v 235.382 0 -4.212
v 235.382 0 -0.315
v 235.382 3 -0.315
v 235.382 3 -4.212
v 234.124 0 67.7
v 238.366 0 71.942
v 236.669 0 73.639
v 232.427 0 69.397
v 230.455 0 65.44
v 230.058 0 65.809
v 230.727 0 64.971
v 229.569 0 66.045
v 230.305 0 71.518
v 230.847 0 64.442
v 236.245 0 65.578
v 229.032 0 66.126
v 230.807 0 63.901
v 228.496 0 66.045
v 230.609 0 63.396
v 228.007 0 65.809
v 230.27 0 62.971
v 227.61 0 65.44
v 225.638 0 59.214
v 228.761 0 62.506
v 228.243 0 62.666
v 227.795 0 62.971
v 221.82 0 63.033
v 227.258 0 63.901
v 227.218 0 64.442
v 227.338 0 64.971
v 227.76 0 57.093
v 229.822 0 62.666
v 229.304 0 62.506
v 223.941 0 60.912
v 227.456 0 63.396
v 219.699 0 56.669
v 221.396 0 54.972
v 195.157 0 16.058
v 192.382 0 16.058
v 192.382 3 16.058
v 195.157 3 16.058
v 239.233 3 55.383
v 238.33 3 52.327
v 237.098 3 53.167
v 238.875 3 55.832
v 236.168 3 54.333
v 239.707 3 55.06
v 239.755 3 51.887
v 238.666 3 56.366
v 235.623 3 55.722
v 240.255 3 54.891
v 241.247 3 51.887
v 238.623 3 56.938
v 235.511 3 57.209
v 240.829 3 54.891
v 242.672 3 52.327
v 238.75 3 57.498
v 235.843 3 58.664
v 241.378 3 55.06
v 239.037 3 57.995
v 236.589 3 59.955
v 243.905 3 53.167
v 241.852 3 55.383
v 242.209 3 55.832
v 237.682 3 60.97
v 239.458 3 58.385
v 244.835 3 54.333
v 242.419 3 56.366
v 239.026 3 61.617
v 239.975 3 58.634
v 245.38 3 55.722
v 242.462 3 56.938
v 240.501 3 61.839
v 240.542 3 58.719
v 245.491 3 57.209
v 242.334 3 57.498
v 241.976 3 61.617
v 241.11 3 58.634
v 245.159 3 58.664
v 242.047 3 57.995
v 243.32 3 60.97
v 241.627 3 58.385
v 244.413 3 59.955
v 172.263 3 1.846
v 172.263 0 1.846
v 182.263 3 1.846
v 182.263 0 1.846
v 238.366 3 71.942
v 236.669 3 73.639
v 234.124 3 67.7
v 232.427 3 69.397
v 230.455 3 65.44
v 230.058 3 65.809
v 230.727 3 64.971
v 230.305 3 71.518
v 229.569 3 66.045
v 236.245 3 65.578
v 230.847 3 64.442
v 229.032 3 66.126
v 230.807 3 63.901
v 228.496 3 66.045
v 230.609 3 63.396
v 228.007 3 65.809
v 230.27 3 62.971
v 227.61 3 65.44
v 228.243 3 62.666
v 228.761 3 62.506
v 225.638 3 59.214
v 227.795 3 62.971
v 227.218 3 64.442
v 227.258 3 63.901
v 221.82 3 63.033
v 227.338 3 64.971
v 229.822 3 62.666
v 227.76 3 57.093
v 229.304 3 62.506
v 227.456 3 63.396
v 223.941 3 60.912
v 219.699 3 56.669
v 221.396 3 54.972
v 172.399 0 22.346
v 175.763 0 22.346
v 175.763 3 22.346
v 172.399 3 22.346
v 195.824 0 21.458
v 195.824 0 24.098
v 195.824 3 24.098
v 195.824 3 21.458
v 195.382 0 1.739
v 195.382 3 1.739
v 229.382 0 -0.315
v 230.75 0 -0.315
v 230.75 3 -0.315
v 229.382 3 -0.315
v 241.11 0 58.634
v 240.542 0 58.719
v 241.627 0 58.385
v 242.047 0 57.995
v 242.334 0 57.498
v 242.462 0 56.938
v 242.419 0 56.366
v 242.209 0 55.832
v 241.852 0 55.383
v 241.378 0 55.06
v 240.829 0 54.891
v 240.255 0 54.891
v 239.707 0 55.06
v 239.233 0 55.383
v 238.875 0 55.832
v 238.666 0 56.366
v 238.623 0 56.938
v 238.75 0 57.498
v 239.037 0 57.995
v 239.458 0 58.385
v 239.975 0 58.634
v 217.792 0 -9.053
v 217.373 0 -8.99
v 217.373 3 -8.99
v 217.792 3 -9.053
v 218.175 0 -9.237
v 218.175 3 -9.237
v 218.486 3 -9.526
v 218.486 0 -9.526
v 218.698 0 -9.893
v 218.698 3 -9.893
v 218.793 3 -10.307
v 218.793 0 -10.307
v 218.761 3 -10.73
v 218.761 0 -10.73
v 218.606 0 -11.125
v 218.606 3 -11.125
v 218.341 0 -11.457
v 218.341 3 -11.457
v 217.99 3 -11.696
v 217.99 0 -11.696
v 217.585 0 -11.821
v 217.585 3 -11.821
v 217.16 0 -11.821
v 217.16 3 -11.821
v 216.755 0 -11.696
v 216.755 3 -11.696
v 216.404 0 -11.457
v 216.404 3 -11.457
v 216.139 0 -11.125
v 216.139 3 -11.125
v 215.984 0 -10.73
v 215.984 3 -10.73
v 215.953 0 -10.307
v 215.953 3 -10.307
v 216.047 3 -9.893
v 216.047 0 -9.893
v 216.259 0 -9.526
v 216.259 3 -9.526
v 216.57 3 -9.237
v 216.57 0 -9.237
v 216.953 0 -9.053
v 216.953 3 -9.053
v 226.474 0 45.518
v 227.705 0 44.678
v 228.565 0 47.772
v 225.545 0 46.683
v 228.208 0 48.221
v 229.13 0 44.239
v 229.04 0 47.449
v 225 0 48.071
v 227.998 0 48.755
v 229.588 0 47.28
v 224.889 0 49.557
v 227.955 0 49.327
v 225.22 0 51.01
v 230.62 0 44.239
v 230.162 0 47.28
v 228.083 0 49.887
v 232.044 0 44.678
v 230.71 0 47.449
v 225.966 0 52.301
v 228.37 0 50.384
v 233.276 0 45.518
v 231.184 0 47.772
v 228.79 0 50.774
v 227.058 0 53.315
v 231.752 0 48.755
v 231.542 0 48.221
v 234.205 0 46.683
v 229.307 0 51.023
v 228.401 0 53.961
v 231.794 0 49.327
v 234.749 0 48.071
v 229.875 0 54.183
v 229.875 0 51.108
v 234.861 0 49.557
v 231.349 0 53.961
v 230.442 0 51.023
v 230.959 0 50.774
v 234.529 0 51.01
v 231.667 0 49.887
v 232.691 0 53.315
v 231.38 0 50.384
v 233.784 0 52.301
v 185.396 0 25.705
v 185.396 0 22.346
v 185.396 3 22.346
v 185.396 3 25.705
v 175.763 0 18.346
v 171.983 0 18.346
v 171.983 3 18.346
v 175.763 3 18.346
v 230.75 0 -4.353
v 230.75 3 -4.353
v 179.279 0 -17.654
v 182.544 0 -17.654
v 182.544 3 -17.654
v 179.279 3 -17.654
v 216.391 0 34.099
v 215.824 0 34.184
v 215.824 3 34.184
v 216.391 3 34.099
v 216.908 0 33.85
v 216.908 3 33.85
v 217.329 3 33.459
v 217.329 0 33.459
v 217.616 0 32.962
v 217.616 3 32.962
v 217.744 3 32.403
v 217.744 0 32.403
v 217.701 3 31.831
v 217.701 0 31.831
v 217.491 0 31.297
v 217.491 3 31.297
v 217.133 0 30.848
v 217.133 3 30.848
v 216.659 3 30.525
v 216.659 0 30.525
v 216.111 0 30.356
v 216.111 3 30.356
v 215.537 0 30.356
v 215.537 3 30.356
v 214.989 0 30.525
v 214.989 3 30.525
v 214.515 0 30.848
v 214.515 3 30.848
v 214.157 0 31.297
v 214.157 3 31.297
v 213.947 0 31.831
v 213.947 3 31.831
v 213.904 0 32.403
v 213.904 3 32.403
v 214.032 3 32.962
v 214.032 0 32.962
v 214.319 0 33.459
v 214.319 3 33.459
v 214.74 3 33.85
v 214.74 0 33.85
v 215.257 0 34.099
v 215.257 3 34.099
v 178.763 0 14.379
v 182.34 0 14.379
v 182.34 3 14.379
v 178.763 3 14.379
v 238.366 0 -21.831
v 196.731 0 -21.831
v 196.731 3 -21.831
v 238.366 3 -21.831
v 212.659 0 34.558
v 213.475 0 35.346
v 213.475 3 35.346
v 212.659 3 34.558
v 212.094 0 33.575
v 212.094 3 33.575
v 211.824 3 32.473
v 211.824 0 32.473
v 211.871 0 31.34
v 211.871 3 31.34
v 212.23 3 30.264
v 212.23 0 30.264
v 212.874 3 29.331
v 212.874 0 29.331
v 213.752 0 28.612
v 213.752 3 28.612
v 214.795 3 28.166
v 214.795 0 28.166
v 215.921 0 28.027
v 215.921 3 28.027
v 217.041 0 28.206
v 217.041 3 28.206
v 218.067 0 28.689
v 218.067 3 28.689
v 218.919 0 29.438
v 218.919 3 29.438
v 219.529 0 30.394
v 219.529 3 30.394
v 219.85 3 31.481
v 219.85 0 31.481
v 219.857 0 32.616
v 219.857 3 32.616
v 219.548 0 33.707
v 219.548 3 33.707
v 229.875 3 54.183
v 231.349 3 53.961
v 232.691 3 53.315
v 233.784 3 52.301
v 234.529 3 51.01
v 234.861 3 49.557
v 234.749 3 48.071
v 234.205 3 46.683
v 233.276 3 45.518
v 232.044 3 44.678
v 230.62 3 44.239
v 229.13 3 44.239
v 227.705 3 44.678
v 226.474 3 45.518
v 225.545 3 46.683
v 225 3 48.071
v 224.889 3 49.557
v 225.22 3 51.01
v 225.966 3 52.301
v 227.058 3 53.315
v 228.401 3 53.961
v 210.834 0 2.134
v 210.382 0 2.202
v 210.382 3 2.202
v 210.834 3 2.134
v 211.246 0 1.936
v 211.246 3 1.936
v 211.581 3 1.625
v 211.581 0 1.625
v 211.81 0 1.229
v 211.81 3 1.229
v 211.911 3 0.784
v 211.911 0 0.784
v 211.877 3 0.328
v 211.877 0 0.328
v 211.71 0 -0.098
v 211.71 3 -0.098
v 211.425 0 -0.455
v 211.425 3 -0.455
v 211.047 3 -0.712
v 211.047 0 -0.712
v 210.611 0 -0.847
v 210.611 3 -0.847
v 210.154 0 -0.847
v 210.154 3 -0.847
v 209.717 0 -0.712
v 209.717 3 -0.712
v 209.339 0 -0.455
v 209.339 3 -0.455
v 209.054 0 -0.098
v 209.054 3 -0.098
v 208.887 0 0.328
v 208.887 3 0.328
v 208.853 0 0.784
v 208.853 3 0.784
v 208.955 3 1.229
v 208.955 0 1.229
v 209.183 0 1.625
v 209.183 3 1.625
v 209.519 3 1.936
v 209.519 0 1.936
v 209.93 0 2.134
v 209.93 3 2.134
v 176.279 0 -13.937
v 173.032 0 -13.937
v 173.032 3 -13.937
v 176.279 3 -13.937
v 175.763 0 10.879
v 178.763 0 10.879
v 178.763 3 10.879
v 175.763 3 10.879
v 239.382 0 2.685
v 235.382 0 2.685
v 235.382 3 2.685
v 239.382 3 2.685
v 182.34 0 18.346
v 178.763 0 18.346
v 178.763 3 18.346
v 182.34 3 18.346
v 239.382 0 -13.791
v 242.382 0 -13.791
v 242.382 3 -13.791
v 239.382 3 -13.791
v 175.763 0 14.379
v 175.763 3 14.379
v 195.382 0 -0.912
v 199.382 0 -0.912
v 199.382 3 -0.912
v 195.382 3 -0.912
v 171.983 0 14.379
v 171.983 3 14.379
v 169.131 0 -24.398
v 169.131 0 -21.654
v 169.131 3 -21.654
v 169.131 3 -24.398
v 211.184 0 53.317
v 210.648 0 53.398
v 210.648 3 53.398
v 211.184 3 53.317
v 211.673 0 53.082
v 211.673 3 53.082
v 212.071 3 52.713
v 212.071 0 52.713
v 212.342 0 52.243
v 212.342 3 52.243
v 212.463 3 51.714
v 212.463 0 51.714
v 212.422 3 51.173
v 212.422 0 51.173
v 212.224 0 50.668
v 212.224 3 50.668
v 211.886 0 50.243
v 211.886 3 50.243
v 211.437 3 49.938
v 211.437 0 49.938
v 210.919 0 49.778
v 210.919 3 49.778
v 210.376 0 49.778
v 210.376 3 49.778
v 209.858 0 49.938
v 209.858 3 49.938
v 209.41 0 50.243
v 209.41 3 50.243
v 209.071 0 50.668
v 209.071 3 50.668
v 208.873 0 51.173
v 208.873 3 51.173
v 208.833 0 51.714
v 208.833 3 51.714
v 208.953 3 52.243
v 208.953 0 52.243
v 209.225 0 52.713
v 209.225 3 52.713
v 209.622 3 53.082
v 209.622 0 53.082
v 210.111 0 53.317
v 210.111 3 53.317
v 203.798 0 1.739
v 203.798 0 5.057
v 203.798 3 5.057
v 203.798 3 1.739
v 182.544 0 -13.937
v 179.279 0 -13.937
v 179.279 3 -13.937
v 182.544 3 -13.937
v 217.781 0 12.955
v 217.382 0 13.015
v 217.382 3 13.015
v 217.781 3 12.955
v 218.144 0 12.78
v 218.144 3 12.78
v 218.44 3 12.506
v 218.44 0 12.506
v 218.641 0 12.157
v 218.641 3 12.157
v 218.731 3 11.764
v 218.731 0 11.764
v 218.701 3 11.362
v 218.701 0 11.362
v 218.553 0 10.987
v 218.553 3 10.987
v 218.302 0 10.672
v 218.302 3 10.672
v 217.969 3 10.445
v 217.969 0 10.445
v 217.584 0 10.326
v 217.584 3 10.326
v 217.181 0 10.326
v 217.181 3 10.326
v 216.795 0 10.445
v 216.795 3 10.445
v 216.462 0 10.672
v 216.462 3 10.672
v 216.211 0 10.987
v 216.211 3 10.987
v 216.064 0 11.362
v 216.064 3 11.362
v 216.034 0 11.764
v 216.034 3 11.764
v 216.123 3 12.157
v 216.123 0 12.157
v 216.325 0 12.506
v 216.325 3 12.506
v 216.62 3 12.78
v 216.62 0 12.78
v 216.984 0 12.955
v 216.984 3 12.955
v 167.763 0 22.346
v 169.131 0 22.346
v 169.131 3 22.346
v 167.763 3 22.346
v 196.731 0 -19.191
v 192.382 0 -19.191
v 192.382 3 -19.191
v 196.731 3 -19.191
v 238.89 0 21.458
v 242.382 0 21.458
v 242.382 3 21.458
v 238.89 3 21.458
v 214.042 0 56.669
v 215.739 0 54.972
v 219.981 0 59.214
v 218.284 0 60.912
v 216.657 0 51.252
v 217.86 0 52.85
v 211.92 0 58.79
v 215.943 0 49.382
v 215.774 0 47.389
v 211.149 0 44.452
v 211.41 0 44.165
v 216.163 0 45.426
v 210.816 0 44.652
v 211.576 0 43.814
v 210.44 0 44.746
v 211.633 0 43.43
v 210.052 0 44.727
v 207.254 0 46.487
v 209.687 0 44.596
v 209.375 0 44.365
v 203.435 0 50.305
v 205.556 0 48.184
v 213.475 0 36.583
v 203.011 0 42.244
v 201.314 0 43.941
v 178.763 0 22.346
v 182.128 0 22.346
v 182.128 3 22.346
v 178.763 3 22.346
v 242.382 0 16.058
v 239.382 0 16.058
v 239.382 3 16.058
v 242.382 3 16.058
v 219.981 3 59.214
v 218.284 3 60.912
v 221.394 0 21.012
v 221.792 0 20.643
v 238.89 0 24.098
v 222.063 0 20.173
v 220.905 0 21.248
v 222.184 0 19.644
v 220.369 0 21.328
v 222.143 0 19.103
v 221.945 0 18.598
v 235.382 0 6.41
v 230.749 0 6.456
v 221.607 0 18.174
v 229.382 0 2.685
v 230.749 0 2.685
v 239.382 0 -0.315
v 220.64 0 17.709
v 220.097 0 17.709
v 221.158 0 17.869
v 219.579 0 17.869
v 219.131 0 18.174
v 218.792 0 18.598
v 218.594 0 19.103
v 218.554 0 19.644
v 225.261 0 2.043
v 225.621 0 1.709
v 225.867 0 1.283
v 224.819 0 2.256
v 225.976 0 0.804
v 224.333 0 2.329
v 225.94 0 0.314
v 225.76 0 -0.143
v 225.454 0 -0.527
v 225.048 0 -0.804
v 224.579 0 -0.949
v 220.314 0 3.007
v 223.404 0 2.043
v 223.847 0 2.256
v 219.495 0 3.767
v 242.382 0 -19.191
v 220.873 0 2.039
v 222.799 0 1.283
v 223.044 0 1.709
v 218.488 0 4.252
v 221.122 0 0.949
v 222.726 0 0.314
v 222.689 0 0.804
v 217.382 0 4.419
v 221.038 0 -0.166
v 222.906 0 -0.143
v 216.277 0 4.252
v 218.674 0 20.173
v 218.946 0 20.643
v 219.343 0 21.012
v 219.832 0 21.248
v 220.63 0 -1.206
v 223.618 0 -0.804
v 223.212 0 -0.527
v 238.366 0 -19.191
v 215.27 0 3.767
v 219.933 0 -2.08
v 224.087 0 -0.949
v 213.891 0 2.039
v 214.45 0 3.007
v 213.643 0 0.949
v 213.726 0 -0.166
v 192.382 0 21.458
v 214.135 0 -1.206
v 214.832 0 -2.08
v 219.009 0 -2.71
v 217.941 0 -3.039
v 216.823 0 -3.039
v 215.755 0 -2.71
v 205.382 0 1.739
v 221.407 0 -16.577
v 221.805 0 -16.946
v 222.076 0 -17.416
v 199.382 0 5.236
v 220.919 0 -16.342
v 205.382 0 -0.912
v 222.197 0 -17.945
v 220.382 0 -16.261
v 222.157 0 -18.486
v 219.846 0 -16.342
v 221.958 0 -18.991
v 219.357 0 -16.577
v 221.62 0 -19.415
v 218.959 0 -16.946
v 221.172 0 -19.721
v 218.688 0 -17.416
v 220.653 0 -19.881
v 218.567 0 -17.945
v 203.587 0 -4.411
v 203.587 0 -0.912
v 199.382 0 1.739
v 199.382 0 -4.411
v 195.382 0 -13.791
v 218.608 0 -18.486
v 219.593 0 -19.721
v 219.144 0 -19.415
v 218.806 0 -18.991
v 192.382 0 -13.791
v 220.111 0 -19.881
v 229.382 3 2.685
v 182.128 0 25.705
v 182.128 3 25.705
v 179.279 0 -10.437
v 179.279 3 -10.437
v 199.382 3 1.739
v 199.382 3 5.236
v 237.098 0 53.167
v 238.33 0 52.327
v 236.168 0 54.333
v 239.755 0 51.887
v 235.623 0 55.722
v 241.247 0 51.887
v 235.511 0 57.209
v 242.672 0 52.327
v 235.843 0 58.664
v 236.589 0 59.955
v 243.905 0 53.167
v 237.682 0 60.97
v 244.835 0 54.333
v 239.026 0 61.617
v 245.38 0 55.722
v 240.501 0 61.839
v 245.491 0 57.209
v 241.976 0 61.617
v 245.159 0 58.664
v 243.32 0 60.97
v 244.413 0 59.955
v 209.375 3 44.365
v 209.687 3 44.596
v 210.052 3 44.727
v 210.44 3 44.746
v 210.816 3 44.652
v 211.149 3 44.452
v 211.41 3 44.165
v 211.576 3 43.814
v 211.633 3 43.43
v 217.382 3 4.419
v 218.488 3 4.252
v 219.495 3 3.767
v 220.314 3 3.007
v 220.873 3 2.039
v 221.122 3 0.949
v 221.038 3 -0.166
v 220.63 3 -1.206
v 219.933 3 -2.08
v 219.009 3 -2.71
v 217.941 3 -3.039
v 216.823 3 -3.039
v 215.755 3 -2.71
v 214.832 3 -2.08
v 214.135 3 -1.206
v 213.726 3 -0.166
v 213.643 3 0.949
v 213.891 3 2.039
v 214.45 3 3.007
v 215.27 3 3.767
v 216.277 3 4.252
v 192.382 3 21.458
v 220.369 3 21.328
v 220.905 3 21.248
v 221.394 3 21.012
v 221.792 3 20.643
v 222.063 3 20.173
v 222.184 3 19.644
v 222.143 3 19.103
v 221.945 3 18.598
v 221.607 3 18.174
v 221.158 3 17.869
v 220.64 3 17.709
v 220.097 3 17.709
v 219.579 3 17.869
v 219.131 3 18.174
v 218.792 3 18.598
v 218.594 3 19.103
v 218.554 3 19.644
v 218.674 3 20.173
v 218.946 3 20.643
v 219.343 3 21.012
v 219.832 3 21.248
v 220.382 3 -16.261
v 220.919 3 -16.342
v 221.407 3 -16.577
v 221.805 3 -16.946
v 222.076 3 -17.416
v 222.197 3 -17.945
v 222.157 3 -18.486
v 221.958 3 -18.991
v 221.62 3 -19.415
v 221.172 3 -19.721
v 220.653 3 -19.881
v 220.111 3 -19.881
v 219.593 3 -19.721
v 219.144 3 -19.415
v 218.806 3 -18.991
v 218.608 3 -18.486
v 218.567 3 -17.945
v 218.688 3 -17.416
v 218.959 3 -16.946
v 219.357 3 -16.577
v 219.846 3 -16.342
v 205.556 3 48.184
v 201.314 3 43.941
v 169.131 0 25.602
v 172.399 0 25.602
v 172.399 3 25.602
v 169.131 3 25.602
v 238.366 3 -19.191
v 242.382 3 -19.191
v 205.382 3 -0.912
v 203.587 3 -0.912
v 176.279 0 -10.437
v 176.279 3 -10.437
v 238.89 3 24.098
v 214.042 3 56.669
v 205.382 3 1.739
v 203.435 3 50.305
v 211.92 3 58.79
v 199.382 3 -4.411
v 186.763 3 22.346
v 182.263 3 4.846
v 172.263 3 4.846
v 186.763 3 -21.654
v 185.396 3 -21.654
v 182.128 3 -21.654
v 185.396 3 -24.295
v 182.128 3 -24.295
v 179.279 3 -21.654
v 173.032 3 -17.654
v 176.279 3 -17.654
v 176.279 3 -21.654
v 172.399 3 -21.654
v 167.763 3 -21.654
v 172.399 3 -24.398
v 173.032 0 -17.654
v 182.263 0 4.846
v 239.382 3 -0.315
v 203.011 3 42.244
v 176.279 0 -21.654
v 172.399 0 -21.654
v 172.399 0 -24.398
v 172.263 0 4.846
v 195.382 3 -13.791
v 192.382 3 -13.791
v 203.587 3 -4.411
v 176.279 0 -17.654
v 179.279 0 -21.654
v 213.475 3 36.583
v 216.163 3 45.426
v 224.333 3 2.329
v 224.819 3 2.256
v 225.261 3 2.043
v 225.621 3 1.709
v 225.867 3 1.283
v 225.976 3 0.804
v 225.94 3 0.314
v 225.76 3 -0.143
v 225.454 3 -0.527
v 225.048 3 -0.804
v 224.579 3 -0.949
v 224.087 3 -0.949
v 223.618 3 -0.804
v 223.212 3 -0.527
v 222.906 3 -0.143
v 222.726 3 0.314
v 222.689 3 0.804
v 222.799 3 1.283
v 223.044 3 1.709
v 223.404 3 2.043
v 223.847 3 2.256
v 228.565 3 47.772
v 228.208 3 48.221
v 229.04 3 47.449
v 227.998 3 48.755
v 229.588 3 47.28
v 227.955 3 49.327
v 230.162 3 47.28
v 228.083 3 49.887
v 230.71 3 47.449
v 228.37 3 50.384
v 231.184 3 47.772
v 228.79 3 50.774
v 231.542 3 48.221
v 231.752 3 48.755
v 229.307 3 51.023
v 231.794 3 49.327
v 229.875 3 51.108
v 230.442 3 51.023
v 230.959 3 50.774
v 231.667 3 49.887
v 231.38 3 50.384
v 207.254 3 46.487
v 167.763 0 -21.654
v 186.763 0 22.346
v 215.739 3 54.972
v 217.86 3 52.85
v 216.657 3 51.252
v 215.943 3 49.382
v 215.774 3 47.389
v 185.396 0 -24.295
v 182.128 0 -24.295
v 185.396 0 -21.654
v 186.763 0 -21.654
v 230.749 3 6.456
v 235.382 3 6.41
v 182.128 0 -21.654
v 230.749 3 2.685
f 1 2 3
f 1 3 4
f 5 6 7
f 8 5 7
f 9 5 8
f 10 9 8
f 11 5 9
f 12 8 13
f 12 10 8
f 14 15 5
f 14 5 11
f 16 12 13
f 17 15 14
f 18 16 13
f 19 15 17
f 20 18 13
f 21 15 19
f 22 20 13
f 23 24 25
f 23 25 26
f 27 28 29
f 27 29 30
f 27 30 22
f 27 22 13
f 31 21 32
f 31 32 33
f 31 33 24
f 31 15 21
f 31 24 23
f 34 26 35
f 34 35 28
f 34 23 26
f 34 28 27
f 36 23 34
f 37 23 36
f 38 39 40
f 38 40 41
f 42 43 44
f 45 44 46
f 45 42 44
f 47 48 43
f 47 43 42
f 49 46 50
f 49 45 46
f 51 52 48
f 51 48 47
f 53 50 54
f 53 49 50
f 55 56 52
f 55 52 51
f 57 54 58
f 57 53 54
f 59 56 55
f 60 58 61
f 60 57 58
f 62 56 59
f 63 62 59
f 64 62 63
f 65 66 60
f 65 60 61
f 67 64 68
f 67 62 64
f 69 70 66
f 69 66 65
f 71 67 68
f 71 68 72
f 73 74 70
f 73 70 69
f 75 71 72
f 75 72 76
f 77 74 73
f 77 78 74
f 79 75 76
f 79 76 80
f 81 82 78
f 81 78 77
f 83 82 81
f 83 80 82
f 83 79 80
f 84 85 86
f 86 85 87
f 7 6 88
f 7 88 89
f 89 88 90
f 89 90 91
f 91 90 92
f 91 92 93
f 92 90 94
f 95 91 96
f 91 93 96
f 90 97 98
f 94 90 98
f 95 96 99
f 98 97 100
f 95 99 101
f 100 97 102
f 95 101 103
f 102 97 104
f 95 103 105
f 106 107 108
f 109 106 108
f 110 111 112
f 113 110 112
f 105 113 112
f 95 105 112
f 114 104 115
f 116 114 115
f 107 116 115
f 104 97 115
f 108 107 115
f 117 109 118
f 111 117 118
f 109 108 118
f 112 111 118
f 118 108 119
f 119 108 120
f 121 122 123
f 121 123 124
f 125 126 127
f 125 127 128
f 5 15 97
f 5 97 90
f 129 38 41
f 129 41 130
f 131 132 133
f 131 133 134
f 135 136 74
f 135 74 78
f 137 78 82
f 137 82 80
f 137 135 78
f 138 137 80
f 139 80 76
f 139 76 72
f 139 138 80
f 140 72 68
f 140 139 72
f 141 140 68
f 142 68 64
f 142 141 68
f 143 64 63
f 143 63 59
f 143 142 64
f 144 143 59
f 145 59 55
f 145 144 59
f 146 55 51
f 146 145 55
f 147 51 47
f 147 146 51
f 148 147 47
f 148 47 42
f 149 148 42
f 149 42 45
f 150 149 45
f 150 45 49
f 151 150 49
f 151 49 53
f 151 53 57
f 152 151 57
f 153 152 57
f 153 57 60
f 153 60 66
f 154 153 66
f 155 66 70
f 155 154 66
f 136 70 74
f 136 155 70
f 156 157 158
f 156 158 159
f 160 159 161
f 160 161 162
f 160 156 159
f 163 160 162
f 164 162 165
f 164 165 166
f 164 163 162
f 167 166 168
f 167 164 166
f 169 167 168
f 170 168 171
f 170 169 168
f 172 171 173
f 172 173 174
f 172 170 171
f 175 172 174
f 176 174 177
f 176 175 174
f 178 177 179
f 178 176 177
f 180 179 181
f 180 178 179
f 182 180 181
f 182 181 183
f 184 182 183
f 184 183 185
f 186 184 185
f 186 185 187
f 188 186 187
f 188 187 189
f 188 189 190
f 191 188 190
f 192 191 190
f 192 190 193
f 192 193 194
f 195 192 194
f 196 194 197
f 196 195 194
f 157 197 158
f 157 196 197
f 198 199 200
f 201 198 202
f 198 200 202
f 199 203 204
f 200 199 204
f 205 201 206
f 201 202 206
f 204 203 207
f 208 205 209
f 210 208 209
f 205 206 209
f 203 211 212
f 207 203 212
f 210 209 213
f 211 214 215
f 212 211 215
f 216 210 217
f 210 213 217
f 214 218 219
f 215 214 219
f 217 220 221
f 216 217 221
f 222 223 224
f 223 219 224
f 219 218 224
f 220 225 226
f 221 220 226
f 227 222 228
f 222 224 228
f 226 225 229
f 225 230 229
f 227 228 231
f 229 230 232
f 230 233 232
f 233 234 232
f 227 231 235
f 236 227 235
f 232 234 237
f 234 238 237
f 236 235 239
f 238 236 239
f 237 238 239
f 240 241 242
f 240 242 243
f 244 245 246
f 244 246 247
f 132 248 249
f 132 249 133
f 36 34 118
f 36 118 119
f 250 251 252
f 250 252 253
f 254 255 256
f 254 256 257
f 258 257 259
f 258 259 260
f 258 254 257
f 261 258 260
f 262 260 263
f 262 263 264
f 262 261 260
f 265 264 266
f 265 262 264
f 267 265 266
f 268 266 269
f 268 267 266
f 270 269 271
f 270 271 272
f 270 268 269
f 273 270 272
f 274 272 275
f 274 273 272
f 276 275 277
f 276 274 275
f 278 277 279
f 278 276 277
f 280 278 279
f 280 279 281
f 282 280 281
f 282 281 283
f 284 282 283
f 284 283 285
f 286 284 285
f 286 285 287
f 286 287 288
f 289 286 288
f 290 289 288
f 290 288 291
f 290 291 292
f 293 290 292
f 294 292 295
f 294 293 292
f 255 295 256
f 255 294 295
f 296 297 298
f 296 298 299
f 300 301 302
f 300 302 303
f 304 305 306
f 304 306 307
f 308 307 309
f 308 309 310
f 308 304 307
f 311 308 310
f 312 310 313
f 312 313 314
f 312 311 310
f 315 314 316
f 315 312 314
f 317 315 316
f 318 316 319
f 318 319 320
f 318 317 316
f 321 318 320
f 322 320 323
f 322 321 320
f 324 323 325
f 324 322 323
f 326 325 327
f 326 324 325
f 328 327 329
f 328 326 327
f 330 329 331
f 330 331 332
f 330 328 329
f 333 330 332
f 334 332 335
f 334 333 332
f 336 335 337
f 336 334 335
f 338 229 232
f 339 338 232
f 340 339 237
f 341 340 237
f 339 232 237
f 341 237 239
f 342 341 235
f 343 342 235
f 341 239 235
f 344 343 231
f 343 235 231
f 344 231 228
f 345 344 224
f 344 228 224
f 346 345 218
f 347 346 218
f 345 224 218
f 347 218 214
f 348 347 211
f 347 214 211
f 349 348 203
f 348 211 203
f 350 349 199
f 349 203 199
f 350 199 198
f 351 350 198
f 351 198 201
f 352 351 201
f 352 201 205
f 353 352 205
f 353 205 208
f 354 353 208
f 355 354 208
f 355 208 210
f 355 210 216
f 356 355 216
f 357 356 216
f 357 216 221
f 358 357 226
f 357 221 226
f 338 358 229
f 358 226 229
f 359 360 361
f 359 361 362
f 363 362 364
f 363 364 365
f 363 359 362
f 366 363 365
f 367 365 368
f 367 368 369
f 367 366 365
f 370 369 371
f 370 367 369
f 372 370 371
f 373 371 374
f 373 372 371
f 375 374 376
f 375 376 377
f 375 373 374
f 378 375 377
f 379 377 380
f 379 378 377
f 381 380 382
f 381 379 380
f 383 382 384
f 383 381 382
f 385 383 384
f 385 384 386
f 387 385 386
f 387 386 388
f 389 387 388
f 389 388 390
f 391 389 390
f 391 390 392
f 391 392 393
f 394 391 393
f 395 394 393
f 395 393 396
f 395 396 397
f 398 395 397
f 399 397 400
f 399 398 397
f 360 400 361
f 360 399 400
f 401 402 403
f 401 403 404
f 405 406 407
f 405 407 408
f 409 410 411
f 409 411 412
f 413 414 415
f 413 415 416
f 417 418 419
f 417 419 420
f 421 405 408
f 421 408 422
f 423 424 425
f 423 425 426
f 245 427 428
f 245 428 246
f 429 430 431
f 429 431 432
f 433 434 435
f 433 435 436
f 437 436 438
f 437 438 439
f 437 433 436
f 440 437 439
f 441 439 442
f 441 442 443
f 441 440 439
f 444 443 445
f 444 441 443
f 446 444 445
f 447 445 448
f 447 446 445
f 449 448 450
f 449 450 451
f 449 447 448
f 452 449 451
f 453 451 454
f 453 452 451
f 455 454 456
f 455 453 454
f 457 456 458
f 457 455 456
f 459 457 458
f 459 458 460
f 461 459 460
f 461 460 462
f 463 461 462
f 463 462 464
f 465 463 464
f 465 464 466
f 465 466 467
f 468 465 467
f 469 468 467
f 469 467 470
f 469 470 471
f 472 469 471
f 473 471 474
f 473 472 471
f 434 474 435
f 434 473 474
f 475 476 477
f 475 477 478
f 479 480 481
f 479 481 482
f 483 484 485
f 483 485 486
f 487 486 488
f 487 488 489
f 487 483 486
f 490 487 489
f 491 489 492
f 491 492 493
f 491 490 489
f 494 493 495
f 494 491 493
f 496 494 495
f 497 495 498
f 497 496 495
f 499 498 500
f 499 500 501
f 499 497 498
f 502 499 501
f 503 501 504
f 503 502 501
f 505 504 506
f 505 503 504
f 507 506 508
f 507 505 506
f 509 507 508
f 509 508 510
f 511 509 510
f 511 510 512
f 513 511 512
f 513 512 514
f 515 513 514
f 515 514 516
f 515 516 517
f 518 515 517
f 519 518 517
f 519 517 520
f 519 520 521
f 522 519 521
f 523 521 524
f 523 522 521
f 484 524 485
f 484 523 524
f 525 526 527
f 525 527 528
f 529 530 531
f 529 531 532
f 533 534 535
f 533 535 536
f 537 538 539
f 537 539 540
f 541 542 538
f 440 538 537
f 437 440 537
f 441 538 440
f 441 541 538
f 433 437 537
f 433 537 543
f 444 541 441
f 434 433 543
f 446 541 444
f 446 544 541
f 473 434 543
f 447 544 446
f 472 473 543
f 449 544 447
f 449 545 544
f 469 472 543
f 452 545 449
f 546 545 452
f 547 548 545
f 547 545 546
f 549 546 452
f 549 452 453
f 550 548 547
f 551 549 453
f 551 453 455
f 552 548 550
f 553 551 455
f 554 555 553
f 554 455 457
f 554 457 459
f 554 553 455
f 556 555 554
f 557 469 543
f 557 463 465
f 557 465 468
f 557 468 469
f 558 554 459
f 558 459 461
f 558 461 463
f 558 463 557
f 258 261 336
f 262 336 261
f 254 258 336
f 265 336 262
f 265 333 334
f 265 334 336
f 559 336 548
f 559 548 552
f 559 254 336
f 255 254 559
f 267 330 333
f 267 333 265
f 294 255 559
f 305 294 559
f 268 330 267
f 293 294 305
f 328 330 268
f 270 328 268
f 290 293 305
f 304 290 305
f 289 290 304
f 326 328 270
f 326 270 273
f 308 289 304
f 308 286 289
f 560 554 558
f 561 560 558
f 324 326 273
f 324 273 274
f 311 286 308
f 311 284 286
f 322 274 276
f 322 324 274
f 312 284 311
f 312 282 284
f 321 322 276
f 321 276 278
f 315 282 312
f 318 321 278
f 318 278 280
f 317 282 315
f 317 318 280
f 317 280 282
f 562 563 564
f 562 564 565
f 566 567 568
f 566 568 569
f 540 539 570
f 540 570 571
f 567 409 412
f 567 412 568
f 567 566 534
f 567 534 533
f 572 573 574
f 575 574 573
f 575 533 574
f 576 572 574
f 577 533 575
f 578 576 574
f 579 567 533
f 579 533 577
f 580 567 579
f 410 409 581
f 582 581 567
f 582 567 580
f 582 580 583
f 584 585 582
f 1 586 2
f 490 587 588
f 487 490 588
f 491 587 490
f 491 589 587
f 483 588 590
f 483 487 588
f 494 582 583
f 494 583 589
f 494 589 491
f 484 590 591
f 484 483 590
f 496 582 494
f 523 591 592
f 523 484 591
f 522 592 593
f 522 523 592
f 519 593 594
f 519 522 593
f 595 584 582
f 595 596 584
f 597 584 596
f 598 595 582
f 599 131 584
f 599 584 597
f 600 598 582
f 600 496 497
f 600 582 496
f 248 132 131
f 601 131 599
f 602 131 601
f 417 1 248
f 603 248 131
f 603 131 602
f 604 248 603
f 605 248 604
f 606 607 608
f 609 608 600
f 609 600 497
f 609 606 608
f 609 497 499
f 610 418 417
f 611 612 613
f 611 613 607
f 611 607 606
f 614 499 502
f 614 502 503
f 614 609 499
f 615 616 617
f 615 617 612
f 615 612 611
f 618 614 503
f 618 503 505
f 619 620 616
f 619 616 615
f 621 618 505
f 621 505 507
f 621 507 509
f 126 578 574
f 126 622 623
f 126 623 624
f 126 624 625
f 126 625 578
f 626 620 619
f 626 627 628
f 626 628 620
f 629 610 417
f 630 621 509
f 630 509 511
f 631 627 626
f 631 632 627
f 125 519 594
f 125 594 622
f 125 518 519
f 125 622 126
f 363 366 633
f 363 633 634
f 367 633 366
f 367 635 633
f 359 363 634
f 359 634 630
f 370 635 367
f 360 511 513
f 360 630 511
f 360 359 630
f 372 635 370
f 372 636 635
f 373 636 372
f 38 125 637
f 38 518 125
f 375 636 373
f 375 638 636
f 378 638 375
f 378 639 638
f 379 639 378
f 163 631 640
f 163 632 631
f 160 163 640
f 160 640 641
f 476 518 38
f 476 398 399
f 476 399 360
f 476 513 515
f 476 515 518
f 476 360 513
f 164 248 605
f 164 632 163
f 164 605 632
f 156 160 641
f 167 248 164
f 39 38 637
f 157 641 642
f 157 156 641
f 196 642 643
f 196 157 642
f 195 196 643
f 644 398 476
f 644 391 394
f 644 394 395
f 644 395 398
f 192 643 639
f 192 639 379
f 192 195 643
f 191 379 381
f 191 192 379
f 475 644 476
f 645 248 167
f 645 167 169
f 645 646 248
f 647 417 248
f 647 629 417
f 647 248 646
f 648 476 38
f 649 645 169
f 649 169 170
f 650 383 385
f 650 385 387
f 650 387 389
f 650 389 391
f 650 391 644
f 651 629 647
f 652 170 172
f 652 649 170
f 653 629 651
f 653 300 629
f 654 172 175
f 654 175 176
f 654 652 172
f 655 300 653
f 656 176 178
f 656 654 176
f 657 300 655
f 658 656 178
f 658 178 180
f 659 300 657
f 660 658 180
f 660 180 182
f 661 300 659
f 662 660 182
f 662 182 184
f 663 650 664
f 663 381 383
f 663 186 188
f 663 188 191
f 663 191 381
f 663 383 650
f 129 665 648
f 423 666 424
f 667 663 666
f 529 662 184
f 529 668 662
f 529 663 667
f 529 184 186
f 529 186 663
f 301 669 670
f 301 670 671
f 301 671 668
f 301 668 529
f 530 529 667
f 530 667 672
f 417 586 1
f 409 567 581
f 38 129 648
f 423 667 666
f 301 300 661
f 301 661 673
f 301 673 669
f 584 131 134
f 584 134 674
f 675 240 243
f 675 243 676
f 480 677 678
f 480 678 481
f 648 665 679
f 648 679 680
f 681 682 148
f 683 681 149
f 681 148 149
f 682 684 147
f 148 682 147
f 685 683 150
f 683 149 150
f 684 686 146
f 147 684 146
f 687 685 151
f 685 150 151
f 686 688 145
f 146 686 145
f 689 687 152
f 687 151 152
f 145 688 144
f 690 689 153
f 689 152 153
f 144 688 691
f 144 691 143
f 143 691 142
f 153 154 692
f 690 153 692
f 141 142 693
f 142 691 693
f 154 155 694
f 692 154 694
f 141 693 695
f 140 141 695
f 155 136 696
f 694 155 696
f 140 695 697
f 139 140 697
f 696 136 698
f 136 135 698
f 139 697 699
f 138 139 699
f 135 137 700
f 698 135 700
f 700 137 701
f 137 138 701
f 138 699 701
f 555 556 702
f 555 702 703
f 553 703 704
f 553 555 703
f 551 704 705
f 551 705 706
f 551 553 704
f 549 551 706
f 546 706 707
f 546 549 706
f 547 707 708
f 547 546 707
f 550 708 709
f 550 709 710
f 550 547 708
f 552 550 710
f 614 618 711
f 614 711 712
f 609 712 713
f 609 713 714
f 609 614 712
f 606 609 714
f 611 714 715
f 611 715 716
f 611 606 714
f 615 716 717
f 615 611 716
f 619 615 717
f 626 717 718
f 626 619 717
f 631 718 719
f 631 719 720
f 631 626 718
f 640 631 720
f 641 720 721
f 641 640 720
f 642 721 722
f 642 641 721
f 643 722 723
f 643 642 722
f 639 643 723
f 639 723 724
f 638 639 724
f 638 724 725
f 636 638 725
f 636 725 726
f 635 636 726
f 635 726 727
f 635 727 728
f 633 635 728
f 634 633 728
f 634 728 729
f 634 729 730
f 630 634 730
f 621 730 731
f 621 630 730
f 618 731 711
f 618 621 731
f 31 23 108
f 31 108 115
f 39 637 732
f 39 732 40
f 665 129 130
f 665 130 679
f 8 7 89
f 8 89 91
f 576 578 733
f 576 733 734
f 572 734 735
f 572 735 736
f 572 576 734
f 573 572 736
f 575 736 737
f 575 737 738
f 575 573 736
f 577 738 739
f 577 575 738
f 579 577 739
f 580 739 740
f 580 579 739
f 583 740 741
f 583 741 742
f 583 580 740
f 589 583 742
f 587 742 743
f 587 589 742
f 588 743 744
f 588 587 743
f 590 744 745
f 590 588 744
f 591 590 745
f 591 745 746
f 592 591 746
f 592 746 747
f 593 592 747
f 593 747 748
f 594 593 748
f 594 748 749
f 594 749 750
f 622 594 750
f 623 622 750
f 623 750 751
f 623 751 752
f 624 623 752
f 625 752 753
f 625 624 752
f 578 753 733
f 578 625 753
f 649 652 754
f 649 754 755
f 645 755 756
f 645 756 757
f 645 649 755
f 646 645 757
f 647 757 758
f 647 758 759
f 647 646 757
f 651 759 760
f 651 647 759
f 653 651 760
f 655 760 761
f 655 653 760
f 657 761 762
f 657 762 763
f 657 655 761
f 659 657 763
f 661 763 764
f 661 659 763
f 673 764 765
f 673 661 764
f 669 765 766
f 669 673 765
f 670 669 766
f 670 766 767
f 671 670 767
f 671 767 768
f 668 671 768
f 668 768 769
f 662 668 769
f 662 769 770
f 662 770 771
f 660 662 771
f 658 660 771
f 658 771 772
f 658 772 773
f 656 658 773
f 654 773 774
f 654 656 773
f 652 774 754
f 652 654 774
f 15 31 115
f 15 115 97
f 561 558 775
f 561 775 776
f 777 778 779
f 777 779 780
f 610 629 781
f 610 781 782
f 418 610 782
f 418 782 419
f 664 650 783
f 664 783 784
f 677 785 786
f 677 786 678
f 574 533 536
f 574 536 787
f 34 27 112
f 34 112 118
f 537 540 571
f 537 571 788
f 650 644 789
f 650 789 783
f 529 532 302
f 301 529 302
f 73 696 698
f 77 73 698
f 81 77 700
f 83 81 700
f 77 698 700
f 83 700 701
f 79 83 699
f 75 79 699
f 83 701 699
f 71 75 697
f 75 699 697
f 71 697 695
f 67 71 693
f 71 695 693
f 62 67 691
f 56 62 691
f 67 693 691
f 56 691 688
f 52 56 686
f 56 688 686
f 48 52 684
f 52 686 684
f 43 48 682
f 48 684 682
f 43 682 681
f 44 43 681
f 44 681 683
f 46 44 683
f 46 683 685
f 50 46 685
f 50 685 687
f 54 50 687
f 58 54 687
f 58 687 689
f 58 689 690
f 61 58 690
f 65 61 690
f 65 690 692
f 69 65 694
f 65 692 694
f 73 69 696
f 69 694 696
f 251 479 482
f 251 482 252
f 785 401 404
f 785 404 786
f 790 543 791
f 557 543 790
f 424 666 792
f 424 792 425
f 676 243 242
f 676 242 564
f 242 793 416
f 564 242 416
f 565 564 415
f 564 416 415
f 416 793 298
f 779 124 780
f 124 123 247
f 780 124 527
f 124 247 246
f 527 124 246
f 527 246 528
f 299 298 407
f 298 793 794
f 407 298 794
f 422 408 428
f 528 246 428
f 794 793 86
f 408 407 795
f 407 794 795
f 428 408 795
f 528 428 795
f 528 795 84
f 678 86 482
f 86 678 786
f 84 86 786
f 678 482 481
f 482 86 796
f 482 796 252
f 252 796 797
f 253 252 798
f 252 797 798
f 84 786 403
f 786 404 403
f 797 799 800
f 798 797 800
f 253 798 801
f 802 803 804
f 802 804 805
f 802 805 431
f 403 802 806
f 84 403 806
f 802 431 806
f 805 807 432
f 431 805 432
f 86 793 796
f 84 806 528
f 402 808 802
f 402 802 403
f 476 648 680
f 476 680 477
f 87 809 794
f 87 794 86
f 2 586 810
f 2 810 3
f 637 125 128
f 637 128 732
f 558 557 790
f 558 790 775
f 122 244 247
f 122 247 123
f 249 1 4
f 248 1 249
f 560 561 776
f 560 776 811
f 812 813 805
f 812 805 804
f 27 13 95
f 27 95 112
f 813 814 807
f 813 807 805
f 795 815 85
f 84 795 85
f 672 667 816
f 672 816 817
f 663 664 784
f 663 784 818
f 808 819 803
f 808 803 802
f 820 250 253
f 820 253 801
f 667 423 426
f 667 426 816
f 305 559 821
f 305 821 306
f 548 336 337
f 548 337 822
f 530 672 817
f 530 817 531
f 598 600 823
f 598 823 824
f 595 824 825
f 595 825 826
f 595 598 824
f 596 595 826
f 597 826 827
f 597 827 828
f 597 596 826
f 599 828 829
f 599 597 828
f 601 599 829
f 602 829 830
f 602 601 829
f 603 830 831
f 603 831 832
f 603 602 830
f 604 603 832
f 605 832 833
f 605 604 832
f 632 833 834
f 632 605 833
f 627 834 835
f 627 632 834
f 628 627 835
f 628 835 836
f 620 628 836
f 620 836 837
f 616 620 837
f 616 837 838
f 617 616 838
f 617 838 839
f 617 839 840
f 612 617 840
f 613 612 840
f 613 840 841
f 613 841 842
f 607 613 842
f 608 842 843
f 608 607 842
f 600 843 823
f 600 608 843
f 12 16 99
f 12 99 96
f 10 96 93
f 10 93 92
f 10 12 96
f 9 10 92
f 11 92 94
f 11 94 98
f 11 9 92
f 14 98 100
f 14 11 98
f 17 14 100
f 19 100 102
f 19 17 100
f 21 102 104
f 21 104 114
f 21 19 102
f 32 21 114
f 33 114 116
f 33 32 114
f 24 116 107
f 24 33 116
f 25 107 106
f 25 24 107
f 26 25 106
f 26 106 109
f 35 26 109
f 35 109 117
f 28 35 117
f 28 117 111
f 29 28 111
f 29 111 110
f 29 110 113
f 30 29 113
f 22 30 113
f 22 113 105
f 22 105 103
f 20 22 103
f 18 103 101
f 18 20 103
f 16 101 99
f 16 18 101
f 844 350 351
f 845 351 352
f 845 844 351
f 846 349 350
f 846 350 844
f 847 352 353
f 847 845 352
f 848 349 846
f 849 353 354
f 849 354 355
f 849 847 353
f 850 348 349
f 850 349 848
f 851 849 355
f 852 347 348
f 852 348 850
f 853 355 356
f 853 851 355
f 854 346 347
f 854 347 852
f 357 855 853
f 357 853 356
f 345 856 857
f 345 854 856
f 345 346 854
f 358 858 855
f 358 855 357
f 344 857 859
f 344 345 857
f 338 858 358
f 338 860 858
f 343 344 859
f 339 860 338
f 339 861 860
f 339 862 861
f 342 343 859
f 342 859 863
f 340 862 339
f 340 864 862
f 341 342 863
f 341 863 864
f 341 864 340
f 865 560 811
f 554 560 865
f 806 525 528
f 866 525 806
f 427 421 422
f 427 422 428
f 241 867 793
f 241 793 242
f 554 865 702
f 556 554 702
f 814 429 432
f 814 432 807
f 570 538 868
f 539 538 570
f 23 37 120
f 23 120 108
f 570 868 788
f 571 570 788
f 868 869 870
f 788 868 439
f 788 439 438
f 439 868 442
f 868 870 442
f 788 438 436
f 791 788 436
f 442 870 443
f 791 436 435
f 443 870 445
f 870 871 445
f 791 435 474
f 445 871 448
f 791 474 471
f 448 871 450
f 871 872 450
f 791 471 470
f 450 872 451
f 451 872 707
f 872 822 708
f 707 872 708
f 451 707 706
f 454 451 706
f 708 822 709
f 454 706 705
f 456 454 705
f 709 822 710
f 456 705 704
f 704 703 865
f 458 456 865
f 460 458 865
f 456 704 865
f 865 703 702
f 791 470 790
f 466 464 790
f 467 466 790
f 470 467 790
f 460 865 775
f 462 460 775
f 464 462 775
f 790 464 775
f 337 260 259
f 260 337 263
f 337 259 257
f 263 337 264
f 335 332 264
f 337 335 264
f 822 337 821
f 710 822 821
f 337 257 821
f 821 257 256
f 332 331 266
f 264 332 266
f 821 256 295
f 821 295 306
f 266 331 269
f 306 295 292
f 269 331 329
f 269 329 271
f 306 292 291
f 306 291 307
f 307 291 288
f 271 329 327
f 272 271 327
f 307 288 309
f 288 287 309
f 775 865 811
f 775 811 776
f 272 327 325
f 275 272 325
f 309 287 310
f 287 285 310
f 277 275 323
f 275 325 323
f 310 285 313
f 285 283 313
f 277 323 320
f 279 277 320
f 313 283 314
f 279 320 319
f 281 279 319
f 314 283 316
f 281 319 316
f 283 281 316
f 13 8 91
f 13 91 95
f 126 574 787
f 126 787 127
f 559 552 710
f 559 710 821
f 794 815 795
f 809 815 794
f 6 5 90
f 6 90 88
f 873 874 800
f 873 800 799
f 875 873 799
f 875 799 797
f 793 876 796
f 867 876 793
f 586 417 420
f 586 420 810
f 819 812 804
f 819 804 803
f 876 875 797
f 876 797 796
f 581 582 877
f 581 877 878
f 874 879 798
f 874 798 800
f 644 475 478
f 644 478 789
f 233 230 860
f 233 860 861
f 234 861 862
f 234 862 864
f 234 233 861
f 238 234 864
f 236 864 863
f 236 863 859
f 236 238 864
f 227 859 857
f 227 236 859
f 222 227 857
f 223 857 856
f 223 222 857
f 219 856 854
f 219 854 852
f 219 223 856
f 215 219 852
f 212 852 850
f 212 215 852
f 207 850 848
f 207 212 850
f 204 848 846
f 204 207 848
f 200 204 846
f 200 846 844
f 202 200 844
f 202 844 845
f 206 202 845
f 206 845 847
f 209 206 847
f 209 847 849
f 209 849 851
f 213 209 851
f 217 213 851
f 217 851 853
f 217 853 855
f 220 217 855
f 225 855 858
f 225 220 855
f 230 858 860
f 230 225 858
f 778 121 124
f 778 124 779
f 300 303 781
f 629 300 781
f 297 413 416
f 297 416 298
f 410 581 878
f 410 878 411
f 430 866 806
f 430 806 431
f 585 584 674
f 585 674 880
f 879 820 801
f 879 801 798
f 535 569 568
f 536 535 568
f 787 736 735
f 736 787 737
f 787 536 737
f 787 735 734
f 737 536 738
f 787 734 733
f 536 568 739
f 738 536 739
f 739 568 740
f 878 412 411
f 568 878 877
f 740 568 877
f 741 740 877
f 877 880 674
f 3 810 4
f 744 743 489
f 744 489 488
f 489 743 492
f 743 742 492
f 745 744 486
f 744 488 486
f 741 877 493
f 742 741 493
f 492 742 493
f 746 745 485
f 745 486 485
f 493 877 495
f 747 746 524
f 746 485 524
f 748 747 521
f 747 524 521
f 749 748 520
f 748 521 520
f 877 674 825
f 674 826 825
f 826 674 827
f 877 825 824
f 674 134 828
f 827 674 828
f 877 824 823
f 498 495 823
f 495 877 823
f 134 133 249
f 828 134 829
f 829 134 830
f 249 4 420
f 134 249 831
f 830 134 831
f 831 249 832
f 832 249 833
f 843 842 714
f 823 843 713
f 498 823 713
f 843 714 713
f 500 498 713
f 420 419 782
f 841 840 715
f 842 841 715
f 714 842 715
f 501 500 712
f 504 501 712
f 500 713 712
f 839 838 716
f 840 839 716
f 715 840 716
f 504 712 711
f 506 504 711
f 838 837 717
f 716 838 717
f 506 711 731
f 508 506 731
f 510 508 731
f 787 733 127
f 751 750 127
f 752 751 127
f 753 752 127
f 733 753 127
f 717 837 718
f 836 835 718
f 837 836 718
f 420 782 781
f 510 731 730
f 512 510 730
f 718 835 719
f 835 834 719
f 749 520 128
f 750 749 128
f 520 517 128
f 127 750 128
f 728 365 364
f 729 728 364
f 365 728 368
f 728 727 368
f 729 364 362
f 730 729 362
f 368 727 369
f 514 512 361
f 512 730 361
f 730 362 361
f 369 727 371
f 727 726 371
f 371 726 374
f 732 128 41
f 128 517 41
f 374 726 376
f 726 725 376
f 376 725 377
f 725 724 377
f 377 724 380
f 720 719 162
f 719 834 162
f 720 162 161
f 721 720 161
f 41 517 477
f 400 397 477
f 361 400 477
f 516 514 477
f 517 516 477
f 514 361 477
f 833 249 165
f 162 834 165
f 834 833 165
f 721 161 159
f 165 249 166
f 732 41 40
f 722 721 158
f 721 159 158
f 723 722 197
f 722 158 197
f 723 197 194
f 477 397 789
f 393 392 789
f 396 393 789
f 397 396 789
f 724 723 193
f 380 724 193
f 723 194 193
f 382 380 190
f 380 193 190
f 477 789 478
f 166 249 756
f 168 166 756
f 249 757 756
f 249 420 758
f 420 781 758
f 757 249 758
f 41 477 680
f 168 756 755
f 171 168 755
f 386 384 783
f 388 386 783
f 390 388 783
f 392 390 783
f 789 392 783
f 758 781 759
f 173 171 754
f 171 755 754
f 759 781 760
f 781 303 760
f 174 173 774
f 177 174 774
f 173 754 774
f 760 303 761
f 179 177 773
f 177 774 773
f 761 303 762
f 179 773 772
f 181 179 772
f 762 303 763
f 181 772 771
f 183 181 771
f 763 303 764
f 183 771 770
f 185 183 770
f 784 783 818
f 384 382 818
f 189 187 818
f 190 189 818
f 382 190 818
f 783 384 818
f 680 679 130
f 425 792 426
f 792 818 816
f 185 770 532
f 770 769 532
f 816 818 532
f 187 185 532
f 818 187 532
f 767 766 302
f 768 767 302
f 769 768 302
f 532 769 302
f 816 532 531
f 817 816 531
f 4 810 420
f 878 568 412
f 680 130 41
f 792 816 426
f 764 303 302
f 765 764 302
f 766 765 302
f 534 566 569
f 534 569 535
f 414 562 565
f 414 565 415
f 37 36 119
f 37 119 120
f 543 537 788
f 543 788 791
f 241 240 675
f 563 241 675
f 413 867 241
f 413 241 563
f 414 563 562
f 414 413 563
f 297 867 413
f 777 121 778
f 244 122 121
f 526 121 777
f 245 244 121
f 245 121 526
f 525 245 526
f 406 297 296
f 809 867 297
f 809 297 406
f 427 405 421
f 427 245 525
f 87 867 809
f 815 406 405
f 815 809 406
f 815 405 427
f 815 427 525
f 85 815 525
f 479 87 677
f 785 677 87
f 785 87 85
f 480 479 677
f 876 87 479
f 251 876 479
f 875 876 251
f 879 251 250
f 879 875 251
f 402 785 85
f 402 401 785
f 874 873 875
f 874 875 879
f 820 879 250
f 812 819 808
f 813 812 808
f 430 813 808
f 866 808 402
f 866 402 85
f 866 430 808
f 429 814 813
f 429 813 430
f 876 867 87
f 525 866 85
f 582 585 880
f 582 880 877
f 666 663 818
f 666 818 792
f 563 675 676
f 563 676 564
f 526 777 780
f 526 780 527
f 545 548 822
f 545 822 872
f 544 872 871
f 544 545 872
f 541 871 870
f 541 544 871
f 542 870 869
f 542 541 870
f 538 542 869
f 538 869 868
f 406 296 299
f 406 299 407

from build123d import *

# Parameters (mm, degrees)
SKETCH6_R             = 5.00001662
SKETCH6_R_2           = 1.925
BOSS_EXTRUDE1_DEPTH   = 3
SKETCH6_R_3           = 5.003976988
BOSS_EXTRUDE1_2_DEPTH = 3
SKETCH6_R_4           = 3.75
SKETCH6_R_5           = 1.53326
SKETCH6_R_6           = 1.42391285
SKETCH6_R_7           = 1.648176726
SKETCH6_R_8           = 1.82
SKETCH6_R_9           = 1.352434515
BOSS_EXTRUDE1_3_DEPTH = 3
SKETCH6_W             = 10
SKETCH6_H             = 3
BOSS_EXTRUDE1_4_DEPTH = 3
SKETCH6_R_10          = 1.820084062
BOSS_EXTRUDE1_5_DEPTH = 3
BOSS_EXTRUDE1_6_DEPTH = 3


with BuildPart() as part:
    # Sketch6 → Boss-Extrude1 (new body)
    with BuildSketch(Plane(origin=(0, 0, -6.873626876), x_dir=(1, 0, 0), z_dir=(0, 1, 0))):
        with Locations(Location((229.874784709, -56.056944562, 0), (0, 0, 270))):
            Circle(SKETCH6_R)
        with Locations(Location((229.874784709, -56.056944562, 0), (0, 0, 270))):
            Circle(SKETCH6_R_2, mode=Mode.SUBTRACT)
    extrude(amount=BOSS_EXTRUDE1_DEPTH)


with BuildPart() as body_2:
    # Sketch6 → Boss-Extrude1 2 (new body)
    with BuildSketch(Plane(origin=(0, 0, -6.873626876), x_dir=(1, 0, 0), z_dir=(0, 1, 0))):
        with Locations(Location((240.501206391, -63.709072507, 0), (0, 0, 270))):
            Circle(SKETCH6_R_3)
        with Locations(Location((240.542284709, -63.667989562, 0), (0, 0, 270))):
            Circle(SKETCH6_R_2, mode=Mode.SUBTRACT)
    extrude(amount=BOSS_EXTRUDE1_2_DEPTH)


with BuildPart() as body_3:
    # Sketch6 → Boss-Extrude1 3 (new body)
    with BuildSketch(Plane(origin=(0, 0, -6.873626876), x_dir=(1, 0, 0), z_dir=(0, 1, 0))):
        Polygon((242.382239794, 6.917708836), (239.382239794, 6.917708836), (239.382239794, -6.558967727), (235.382239794, -6.558967727), (235.382239794, -2.661698693), (230.749800061, -2.521076352), (230.749800061, -6.558967727), (229.382239794, -6.558967727), (229.382239794, -9.558967727), (230.748691654, -9.558967727), (230.748691654, -13.329897708), (235.382239794, -13.283644713), (235.382239794, -9.558967727), (239.382239794, -9.558967727), (239.382239794, -22.931889683), (242.382239794, -22.931889683), (242.382239794, -28.331889683), (238.890190267, -28.331889683), (238.890190267, -30.971594022), (195.823762638, -30.971594022), (195.823762638, -28.331889683), (192.382239794, -28.331889683), (192.382239794, -22.931889683), (195.157204069, -22.931889683), (195.382239794, -8.612742778), (199.382239794, -8.612742778), (199.382239794, -12.109207952), (203.797700047, -11.931096242), (203.797700047, -8.612742778), (205.382239794, -8.612742778), (205.382239794, -5.961471436), (203.587068887, -5.961471436), (203.587068887, -2.462294151), (199.382239794, -2.462294151), (199.382239794, -5.961471436), (195.382239794, -5.961471436), (195.382239794, 6.917708836), (192.382239794, 6.917708836), (192.382239794, 12.317708836), (196.731116236, 12.317708836), (196.731116236, 14.957413175), (238.366254708, 14.957413175), (238.366254708, 12.317708836), (242.382239794, 12.317708836), align=None)
        with Locations(Location((217.382239794, -7.542579319, 0), (0, 0, 270))):
            Circle(SKETCH6_R_4, mode=Mode.SUBTRACT)
        with Locations(Location((210.382239794, -7.542586825, 0), (0, 0, 270))):
            Circle(SKETCH6_R_5, mode=Mode.SUBTRACT)
        with Locations(Location((217.372614794, 3.539788175, 0), (0, 0, 270))):
            Circle(SKETCH6_R_6, mode=Mode.SUBTRACT)
        with Locations(Location((224.332886765, -7.554518996, 0), (0, 0, 270))):
            Circle(SKETCH6_R_7, mode=Mode.SUBTRACT)
        with Locations(Location((220.382239794, 11.207413175, 0), (0, 0, 270))):
            Circle(SKETCH6_R_8, mode=Mode.SUBTRACT)
        with Locations(Location((217.382239794, -18.536664507, 0), (0, 0, 270))):
            Circle(SKETCH6_R_9, mode=Mode.SUBTRACT)
        with Locations(Location((220.368609085, -26.382015564, 0), (0, 0, 270))):
            Circle(SKETCH6_R_8, mode=Mode.SUBTRACT)
    extrude(amount=BOSS_EXTRUDE1_3_DEPTH)


with BuildPart() as body_4:
    # Sketch6 → Boss-Extrude1 4 (new body)
    with BuildSketch(Plane(origin=(0, 0, -6.873626876), x_dir=(1, 0, 0), z_dir=(0, 1, 0))):
        Polygon((172.399287959, 17.523976804), (172.399287959, 14.779888825), (176.279351087, 14.779888825), (176.279351087, 10.779888825), (173.032045346, 10.779888825), (173.032045346, 7.062992514), (176.279351087, 7.062992514), (176.279351087, 3.562992514), (179.279351087, 3.562992514), (179.279351087, 7.062992514), (182.543927994, 7.062992514), (182.543927994, 10.779888825), (179.279351087, 10.779888825), (179.279351087, 14.779888825), (182.127695455, 14.779888825), (182.127695455, 17.421571169), (185.39570021, 17.421571169), (185.39570021, 14.779888825), (186.763491707, 14.779888825), (186.763491707, -29.220111175), (185.39570021, -29.220111175), (185.39570021, -32.578428831), (182.127695455, -32.578428831), (182.127695455, -29.220111175), (178.763491707, -29.220111175), (178.763491707, -25.220111175), (182.34039673, -25.220111175), (182.34039673, -21.252563381), (178.763491707, -21.252563381), (178.763491707, -17.752563381), (175.763491707, -17.752563381), (175.763491707, -21.252563381), (171.982778318, -21.252563381), (171.982778318, -25.220111175), (175.763491707, -25.220111175), (175.763491707, -29.220111175), (172.399287959, -29.220111175), (172.399287959, -32.476023196), (169.131283204, -32.476023196), (169.131283204, -29.220111175), (167.763491707, -29.220111175), (167.763491707, 14.779888825), (169.131283204, 14.779888825), (169.131283204, 17.523976804), align=None)
        with Locations((177.263491707, -10.220111175)):
            Rectangle(SKETCH6_W, SKETCH6_H, mode=Mode.SUBTRACT)
    extrude(amount=BOSS_EXTRUDE1_4_DEPTH)


with BuildPart() as body_5:
    # Sketch6 → Boss-Extrude1 5 (new body)
    with BuildSketch(Plane(origin=(0, 0, -6.873626876), x_dir=(1, 0, 0), z_dir=(0, 1, 0))):
        with BuildLine():
            Line((217.860134709, -59.724119562), (215.738834709, -61.845439562))
            Line((215.738834709, -61.845439562), (219.981434709, -66.088079562))
            Line((219.981434709, -66.088079562), (218.284434709, -67.785139562))
            Line((218.284434709, -67.785139562), (214.041739708, -63.542484562))
            Line((214.041739708, -63.542484562), (211.920434709, -65.663809562))
            Line((211.920434709, -65.663809562), (203.435134709, -57.178529562))
            Line((203.435134709, -57.178529562), (205.556434709, -55.057209562))
            Line((205.556434709, -55.057209562), (201.313834709, -50.814569562))
            Line((201.313834709, -50.814569562), (203.010934709, -49.117519562))
            Line((203.010934709, -49.117519562), (207.253534709, -53.360159562))
            Line((207.253534709, -53.360159562), (209.374834709, -51.238839562))
            ThreePointArc((209.374834709, -51.238839562), (210.816400769, -51.525579581), (211.632980333, -50.303478783))
            Line((211.632980333, -50.303478783), (213.474534709, -43.456719562))
            Line((213.474534709, -43.456719562), (213.474534709, -42.219932453))
            ThreePointArc((213.474534709, -42.219932453), (214.794826347, -35.039859898), (219.548340876, -40.580682177))
            Line((219.548340876, -40.580682177), (216.163084709, -52.299499562))
            ThreePointArc((216.163084709, -52.299499562), (215.942727144, -56.256124713), (217.860134709, -59.724119562))
        make_face()
        with Locations(Location((215.824034709, -39.132809562, 0), (0, 0, 270))):
            Circle(SKETCH6_R_2, mode=Mode.SUBTRACT)
        with Locations(Location((210.647634709, -58.451324562, 0), (0, 0, 270))):
            Circle(SKETCH6_R_10, mode=Mode.SUBTRACT)
    extrude(amount=BOSS_EXTRUDE1_5_DEPTH)


with BuildPart() as body_6:
    # Sketch6 → Boss-Extrude1 6 (new body)
    with BuildSketch(Plane(origin=(0, 0, -6.873626876), x_dir=(1, 0, 0), z_dir=(0, 1, 0))):
        Polygon((227.759629709, -63.966754562), (236.244954708, -72.452019563), (234.123654708, -74.573339563), (238.366254708, -78.815979563), (236.669154708, -80.513039563), (232.426554708, -76.270399563), (230.305254708, -78.391719563), (221.819934709, -69.906459562), (223.941234709, -67.785139562), (219.698634709, -63.542489562), (221.395634709, -61.845439562), (225.638334709, -66.088079562), align=None)
        with Locations(Location((229.032434709, -71.179244562, 0), (0, 0, 270))):
            Circle(SKETCH6_R_8, mode=Mode.SUBTRACT)
    extrude(amount=BOSS_EXTRUDE1_6_DEPTH)


solid = Compound([part.part, body_2.part, body_3.part, body_4.part, body_5.part, body_6.part])
